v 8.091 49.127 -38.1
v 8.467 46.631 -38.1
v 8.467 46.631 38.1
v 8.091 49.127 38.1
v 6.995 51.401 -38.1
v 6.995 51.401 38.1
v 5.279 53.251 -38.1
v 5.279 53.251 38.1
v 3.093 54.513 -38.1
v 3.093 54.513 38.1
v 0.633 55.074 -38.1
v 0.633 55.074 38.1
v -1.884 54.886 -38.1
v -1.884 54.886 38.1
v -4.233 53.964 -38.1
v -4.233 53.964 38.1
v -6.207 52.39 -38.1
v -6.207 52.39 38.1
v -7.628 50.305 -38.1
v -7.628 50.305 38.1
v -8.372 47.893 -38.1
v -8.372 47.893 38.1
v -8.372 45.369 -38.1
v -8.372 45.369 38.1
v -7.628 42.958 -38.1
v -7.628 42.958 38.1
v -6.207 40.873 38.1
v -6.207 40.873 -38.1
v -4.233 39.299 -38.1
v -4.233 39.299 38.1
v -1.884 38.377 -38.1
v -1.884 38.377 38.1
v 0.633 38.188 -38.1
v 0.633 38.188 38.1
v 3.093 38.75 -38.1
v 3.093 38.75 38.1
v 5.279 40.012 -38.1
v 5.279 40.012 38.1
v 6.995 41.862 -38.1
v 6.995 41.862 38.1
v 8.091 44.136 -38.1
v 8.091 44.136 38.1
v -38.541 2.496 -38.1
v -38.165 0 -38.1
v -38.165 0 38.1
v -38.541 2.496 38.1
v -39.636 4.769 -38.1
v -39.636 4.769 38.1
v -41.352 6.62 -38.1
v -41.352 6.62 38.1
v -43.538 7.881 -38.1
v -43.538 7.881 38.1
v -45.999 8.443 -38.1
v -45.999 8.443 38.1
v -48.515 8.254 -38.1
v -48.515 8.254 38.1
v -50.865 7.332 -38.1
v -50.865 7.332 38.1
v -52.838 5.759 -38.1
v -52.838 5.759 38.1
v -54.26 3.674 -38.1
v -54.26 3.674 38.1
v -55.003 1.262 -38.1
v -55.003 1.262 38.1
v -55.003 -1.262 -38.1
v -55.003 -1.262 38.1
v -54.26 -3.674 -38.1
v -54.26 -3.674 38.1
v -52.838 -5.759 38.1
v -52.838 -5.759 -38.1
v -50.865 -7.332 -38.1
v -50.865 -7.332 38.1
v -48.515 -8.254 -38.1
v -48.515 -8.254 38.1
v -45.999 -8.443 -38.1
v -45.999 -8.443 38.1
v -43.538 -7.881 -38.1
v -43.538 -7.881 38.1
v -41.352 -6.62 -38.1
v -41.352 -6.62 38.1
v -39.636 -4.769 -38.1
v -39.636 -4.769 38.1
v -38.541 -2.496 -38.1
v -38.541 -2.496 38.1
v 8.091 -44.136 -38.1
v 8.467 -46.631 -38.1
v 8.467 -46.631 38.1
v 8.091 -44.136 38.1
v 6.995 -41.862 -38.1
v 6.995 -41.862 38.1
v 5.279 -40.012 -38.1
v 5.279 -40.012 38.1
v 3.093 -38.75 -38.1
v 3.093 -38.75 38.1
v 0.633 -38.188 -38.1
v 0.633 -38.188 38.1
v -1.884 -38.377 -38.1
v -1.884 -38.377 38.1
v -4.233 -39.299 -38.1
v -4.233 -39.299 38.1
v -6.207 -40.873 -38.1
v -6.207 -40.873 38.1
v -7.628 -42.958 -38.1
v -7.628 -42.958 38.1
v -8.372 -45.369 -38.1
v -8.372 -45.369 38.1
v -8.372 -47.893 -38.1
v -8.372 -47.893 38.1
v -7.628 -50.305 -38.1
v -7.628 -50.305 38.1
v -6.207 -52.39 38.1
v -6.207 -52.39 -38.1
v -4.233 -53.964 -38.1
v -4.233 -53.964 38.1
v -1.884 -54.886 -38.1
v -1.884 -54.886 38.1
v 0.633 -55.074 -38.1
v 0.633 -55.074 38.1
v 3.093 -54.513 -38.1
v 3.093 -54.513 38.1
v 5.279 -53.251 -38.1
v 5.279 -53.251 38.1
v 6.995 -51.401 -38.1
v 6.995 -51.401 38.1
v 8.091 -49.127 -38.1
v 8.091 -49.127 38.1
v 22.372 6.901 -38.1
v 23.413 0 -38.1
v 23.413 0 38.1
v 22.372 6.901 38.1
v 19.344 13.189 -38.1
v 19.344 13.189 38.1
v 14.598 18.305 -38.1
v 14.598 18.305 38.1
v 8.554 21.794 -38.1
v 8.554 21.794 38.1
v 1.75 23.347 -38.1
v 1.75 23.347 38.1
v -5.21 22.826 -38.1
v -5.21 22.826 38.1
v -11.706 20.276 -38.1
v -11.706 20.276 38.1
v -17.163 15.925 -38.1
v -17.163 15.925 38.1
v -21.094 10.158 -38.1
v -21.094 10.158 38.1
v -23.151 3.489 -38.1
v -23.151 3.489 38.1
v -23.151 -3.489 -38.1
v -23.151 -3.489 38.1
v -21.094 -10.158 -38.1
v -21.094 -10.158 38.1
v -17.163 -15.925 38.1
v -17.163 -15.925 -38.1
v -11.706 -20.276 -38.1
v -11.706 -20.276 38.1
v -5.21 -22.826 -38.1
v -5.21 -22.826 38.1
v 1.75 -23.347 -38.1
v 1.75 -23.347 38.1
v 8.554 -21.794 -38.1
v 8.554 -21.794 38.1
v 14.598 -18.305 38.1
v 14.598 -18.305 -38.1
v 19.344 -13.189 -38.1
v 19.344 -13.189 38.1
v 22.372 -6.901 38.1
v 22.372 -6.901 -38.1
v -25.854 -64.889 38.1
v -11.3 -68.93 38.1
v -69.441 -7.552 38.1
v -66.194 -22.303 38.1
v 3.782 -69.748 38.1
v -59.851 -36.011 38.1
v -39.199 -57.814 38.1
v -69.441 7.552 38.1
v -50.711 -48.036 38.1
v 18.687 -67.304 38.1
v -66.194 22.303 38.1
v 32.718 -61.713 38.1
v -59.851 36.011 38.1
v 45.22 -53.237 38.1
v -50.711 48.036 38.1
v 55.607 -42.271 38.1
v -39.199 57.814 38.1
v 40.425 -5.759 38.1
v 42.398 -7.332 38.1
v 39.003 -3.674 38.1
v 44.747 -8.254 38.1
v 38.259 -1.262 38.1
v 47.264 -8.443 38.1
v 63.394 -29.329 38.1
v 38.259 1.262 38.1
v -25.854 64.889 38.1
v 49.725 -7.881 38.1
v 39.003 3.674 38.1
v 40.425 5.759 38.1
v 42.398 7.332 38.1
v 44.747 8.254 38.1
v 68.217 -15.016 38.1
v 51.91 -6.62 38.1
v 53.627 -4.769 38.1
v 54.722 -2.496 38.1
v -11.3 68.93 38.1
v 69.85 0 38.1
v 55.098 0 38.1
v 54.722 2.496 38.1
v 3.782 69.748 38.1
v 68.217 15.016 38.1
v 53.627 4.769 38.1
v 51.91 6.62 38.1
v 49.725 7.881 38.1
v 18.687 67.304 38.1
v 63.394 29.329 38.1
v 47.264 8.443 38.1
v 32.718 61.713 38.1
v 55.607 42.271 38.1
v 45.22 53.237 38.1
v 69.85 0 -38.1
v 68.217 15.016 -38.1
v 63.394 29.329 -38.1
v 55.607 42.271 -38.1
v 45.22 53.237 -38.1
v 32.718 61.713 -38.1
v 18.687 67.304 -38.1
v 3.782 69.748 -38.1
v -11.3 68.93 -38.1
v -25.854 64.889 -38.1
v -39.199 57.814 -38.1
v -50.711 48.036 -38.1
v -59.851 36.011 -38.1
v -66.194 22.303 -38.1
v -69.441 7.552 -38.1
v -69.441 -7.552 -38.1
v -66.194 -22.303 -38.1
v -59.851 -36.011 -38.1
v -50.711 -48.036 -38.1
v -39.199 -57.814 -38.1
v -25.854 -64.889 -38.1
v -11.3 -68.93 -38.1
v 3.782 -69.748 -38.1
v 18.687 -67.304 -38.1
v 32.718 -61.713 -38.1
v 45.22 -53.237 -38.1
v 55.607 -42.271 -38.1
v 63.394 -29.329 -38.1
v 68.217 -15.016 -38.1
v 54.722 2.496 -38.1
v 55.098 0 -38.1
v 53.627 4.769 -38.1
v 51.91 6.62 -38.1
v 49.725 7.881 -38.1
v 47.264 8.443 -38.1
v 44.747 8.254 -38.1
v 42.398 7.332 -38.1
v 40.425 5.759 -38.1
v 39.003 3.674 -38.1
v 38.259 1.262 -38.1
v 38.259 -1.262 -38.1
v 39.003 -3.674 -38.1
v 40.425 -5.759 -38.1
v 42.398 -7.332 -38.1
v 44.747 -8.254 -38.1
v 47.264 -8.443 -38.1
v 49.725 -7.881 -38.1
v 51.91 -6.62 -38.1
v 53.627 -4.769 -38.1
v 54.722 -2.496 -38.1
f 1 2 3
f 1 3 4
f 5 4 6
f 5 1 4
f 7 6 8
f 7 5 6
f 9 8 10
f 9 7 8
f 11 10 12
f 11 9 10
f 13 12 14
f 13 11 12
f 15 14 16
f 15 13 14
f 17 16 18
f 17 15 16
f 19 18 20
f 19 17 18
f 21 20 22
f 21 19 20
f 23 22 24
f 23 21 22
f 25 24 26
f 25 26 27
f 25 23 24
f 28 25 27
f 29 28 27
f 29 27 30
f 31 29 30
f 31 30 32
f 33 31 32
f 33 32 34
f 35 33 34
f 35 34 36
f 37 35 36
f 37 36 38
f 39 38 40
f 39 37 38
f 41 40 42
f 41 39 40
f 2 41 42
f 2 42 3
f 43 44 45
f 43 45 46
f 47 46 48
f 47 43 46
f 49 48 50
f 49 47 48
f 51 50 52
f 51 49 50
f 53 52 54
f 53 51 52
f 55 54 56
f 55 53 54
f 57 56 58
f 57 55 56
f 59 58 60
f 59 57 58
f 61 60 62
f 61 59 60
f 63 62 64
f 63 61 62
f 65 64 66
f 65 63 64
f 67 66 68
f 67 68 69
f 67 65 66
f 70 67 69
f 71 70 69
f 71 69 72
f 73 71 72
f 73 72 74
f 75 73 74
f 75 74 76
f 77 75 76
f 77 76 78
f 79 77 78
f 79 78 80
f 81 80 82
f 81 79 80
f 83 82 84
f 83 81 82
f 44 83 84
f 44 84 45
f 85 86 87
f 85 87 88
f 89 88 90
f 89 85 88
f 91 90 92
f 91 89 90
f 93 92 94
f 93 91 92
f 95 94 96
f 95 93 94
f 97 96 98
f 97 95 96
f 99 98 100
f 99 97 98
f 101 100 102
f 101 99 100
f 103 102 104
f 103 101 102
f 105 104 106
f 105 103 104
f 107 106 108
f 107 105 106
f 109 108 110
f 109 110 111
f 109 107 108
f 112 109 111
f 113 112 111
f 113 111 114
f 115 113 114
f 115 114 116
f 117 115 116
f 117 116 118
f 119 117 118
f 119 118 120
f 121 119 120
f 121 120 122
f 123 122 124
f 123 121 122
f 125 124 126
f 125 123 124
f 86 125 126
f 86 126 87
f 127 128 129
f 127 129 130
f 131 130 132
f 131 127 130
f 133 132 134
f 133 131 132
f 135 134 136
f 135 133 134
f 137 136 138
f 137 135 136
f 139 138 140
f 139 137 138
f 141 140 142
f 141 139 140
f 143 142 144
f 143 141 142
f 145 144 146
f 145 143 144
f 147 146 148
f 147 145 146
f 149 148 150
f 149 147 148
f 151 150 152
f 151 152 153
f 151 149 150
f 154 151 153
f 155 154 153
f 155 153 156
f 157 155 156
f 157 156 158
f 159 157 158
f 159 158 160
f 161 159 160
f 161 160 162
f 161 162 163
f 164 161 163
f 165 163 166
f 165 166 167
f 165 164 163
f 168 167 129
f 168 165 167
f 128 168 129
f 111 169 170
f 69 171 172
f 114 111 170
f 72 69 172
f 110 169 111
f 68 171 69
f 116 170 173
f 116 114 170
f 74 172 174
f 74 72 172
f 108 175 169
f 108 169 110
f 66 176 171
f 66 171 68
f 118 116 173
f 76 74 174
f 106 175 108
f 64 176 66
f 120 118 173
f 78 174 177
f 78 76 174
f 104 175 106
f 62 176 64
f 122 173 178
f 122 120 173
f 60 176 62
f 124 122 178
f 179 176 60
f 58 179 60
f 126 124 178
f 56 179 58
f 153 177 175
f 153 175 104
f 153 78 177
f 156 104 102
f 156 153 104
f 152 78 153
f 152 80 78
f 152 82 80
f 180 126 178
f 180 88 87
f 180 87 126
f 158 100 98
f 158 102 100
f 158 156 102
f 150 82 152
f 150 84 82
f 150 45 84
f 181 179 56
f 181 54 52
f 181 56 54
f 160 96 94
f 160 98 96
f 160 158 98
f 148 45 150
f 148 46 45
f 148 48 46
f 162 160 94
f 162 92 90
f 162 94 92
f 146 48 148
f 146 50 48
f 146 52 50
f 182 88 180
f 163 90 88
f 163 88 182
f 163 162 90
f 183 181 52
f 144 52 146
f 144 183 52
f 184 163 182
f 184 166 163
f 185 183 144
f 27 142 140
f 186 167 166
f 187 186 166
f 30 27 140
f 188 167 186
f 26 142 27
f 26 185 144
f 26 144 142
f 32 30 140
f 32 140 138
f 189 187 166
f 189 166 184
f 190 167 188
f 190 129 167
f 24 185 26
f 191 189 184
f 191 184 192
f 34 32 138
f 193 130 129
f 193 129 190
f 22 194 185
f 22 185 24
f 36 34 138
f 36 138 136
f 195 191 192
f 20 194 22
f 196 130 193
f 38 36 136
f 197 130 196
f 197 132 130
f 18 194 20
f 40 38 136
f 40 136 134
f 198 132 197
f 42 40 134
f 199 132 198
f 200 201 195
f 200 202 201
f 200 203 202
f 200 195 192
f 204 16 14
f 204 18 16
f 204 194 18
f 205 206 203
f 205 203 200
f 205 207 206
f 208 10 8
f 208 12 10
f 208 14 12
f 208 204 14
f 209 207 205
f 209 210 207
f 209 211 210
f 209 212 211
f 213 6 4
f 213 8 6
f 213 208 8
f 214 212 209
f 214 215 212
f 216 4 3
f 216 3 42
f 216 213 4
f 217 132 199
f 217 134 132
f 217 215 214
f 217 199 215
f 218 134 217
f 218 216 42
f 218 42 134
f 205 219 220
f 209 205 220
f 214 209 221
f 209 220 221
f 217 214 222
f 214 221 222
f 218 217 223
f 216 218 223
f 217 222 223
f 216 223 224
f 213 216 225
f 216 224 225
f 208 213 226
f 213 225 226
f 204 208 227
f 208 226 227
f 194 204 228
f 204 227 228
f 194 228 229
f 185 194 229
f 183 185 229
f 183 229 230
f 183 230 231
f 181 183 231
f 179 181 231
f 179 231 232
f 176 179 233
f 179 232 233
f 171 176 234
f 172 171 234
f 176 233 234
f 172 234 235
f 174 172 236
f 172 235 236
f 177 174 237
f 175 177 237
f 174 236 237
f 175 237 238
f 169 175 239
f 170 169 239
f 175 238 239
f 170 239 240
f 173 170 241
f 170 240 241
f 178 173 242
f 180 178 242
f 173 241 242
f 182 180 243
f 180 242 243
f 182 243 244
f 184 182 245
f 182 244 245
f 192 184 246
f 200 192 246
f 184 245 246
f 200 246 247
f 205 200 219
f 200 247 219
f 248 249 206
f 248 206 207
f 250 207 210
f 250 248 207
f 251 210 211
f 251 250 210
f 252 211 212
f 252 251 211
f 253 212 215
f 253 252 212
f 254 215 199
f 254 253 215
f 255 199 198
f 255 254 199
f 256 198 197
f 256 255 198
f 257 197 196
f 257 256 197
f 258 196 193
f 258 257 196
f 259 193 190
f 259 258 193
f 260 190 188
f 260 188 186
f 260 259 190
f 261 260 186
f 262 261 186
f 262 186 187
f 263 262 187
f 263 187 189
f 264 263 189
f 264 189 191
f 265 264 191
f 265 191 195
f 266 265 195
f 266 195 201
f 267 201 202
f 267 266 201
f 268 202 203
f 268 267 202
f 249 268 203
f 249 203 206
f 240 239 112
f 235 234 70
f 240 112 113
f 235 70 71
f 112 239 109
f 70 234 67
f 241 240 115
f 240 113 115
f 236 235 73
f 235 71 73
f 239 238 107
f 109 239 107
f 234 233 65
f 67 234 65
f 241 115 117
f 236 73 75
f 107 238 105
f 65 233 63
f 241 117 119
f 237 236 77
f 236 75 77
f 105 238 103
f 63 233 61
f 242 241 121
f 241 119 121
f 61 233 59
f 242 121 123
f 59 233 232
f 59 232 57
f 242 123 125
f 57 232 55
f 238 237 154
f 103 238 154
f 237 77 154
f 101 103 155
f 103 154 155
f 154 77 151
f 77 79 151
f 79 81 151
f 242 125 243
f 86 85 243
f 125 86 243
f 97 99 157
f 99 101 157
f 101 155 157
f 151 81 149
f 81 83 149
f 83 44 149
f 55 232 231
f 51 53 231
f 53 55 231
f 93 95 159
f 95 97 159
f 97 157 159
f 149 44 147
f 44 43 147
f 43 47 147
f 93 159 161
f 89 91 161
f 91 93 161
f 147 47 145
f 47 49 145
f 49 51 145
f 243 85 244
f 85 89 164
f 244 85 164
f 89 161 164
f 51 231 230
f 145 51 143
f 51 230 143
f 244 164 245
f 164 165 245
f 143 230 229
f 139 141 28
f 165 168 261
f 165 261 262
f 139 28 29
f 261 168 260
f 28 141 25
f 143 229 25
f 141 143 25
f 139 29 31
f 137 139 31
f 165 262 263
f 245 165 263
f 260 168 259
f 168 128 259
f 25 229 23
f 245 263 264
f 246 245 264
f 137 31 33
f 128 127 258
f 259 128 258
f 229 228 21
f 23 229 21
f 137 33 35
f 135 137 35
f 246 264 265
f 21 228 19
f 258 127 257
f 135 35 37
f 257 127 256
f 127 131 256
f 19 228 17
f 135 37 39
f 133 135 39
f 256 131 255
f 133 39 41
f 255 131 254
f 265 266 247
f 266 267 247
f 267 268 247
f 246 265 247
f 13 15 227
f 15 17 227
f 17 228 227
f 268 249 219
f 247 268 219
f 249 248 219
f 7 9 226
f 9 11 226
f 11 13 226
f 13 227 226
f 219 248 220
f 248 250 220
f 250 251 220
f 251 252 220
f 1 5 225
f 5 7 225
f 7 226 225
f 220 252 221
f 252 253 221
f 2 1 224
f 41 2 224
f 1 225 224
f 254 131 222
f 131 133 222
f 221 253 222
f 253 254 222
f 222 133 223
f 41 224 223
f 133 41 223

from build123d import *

# Parameters (mm, degrees)
BOSS_EXTRUDE1_DEPTH      = 38.1
BOSS_EXTRUDE1_DEPTH_BACK = 38.1
SKETCH1_R                = 69.85
SKETCH1_R_2              = 23.412602146
SKETCH1_R_3              = 8.466666667


with BuildPart() as part:
    # Sketch1 → Boss-Extrude1 (new, two sides: drawn at the far end of the back side and taken through both)
    with BuildSketch(Plane.XY.offset(-BOSS_EXTRUDE1_DEPTH_BACK)):
        Circle(SKETCH1_R)
        Circle(SKETCH1_R_2, mode=Mode.SUBTRACT)
        with Locations((-46.631301073, 0)):
            Circle(SKETCH1_R_3, mode=Mode.SUBTRACT)
        with Locations((0, 46.631301073)):
            Circle(SKETCH1_R_3, mode=Mode.SUBTRACT)
        with Locations((46.631301073, 0)):
            Circle(SKETCH1_R_3, mode=Mode.SUBTRACT)
        with Locations((0, -46.631301073)):
            Circle(SKETCH1_R_3, mode=Mode.SUBTRACT)
    extrude(amount=BOSS_EXTRUDE1_DEPTH + BOSS_EXTRUDE1_DEPTH_BACK)


solid = part.part
